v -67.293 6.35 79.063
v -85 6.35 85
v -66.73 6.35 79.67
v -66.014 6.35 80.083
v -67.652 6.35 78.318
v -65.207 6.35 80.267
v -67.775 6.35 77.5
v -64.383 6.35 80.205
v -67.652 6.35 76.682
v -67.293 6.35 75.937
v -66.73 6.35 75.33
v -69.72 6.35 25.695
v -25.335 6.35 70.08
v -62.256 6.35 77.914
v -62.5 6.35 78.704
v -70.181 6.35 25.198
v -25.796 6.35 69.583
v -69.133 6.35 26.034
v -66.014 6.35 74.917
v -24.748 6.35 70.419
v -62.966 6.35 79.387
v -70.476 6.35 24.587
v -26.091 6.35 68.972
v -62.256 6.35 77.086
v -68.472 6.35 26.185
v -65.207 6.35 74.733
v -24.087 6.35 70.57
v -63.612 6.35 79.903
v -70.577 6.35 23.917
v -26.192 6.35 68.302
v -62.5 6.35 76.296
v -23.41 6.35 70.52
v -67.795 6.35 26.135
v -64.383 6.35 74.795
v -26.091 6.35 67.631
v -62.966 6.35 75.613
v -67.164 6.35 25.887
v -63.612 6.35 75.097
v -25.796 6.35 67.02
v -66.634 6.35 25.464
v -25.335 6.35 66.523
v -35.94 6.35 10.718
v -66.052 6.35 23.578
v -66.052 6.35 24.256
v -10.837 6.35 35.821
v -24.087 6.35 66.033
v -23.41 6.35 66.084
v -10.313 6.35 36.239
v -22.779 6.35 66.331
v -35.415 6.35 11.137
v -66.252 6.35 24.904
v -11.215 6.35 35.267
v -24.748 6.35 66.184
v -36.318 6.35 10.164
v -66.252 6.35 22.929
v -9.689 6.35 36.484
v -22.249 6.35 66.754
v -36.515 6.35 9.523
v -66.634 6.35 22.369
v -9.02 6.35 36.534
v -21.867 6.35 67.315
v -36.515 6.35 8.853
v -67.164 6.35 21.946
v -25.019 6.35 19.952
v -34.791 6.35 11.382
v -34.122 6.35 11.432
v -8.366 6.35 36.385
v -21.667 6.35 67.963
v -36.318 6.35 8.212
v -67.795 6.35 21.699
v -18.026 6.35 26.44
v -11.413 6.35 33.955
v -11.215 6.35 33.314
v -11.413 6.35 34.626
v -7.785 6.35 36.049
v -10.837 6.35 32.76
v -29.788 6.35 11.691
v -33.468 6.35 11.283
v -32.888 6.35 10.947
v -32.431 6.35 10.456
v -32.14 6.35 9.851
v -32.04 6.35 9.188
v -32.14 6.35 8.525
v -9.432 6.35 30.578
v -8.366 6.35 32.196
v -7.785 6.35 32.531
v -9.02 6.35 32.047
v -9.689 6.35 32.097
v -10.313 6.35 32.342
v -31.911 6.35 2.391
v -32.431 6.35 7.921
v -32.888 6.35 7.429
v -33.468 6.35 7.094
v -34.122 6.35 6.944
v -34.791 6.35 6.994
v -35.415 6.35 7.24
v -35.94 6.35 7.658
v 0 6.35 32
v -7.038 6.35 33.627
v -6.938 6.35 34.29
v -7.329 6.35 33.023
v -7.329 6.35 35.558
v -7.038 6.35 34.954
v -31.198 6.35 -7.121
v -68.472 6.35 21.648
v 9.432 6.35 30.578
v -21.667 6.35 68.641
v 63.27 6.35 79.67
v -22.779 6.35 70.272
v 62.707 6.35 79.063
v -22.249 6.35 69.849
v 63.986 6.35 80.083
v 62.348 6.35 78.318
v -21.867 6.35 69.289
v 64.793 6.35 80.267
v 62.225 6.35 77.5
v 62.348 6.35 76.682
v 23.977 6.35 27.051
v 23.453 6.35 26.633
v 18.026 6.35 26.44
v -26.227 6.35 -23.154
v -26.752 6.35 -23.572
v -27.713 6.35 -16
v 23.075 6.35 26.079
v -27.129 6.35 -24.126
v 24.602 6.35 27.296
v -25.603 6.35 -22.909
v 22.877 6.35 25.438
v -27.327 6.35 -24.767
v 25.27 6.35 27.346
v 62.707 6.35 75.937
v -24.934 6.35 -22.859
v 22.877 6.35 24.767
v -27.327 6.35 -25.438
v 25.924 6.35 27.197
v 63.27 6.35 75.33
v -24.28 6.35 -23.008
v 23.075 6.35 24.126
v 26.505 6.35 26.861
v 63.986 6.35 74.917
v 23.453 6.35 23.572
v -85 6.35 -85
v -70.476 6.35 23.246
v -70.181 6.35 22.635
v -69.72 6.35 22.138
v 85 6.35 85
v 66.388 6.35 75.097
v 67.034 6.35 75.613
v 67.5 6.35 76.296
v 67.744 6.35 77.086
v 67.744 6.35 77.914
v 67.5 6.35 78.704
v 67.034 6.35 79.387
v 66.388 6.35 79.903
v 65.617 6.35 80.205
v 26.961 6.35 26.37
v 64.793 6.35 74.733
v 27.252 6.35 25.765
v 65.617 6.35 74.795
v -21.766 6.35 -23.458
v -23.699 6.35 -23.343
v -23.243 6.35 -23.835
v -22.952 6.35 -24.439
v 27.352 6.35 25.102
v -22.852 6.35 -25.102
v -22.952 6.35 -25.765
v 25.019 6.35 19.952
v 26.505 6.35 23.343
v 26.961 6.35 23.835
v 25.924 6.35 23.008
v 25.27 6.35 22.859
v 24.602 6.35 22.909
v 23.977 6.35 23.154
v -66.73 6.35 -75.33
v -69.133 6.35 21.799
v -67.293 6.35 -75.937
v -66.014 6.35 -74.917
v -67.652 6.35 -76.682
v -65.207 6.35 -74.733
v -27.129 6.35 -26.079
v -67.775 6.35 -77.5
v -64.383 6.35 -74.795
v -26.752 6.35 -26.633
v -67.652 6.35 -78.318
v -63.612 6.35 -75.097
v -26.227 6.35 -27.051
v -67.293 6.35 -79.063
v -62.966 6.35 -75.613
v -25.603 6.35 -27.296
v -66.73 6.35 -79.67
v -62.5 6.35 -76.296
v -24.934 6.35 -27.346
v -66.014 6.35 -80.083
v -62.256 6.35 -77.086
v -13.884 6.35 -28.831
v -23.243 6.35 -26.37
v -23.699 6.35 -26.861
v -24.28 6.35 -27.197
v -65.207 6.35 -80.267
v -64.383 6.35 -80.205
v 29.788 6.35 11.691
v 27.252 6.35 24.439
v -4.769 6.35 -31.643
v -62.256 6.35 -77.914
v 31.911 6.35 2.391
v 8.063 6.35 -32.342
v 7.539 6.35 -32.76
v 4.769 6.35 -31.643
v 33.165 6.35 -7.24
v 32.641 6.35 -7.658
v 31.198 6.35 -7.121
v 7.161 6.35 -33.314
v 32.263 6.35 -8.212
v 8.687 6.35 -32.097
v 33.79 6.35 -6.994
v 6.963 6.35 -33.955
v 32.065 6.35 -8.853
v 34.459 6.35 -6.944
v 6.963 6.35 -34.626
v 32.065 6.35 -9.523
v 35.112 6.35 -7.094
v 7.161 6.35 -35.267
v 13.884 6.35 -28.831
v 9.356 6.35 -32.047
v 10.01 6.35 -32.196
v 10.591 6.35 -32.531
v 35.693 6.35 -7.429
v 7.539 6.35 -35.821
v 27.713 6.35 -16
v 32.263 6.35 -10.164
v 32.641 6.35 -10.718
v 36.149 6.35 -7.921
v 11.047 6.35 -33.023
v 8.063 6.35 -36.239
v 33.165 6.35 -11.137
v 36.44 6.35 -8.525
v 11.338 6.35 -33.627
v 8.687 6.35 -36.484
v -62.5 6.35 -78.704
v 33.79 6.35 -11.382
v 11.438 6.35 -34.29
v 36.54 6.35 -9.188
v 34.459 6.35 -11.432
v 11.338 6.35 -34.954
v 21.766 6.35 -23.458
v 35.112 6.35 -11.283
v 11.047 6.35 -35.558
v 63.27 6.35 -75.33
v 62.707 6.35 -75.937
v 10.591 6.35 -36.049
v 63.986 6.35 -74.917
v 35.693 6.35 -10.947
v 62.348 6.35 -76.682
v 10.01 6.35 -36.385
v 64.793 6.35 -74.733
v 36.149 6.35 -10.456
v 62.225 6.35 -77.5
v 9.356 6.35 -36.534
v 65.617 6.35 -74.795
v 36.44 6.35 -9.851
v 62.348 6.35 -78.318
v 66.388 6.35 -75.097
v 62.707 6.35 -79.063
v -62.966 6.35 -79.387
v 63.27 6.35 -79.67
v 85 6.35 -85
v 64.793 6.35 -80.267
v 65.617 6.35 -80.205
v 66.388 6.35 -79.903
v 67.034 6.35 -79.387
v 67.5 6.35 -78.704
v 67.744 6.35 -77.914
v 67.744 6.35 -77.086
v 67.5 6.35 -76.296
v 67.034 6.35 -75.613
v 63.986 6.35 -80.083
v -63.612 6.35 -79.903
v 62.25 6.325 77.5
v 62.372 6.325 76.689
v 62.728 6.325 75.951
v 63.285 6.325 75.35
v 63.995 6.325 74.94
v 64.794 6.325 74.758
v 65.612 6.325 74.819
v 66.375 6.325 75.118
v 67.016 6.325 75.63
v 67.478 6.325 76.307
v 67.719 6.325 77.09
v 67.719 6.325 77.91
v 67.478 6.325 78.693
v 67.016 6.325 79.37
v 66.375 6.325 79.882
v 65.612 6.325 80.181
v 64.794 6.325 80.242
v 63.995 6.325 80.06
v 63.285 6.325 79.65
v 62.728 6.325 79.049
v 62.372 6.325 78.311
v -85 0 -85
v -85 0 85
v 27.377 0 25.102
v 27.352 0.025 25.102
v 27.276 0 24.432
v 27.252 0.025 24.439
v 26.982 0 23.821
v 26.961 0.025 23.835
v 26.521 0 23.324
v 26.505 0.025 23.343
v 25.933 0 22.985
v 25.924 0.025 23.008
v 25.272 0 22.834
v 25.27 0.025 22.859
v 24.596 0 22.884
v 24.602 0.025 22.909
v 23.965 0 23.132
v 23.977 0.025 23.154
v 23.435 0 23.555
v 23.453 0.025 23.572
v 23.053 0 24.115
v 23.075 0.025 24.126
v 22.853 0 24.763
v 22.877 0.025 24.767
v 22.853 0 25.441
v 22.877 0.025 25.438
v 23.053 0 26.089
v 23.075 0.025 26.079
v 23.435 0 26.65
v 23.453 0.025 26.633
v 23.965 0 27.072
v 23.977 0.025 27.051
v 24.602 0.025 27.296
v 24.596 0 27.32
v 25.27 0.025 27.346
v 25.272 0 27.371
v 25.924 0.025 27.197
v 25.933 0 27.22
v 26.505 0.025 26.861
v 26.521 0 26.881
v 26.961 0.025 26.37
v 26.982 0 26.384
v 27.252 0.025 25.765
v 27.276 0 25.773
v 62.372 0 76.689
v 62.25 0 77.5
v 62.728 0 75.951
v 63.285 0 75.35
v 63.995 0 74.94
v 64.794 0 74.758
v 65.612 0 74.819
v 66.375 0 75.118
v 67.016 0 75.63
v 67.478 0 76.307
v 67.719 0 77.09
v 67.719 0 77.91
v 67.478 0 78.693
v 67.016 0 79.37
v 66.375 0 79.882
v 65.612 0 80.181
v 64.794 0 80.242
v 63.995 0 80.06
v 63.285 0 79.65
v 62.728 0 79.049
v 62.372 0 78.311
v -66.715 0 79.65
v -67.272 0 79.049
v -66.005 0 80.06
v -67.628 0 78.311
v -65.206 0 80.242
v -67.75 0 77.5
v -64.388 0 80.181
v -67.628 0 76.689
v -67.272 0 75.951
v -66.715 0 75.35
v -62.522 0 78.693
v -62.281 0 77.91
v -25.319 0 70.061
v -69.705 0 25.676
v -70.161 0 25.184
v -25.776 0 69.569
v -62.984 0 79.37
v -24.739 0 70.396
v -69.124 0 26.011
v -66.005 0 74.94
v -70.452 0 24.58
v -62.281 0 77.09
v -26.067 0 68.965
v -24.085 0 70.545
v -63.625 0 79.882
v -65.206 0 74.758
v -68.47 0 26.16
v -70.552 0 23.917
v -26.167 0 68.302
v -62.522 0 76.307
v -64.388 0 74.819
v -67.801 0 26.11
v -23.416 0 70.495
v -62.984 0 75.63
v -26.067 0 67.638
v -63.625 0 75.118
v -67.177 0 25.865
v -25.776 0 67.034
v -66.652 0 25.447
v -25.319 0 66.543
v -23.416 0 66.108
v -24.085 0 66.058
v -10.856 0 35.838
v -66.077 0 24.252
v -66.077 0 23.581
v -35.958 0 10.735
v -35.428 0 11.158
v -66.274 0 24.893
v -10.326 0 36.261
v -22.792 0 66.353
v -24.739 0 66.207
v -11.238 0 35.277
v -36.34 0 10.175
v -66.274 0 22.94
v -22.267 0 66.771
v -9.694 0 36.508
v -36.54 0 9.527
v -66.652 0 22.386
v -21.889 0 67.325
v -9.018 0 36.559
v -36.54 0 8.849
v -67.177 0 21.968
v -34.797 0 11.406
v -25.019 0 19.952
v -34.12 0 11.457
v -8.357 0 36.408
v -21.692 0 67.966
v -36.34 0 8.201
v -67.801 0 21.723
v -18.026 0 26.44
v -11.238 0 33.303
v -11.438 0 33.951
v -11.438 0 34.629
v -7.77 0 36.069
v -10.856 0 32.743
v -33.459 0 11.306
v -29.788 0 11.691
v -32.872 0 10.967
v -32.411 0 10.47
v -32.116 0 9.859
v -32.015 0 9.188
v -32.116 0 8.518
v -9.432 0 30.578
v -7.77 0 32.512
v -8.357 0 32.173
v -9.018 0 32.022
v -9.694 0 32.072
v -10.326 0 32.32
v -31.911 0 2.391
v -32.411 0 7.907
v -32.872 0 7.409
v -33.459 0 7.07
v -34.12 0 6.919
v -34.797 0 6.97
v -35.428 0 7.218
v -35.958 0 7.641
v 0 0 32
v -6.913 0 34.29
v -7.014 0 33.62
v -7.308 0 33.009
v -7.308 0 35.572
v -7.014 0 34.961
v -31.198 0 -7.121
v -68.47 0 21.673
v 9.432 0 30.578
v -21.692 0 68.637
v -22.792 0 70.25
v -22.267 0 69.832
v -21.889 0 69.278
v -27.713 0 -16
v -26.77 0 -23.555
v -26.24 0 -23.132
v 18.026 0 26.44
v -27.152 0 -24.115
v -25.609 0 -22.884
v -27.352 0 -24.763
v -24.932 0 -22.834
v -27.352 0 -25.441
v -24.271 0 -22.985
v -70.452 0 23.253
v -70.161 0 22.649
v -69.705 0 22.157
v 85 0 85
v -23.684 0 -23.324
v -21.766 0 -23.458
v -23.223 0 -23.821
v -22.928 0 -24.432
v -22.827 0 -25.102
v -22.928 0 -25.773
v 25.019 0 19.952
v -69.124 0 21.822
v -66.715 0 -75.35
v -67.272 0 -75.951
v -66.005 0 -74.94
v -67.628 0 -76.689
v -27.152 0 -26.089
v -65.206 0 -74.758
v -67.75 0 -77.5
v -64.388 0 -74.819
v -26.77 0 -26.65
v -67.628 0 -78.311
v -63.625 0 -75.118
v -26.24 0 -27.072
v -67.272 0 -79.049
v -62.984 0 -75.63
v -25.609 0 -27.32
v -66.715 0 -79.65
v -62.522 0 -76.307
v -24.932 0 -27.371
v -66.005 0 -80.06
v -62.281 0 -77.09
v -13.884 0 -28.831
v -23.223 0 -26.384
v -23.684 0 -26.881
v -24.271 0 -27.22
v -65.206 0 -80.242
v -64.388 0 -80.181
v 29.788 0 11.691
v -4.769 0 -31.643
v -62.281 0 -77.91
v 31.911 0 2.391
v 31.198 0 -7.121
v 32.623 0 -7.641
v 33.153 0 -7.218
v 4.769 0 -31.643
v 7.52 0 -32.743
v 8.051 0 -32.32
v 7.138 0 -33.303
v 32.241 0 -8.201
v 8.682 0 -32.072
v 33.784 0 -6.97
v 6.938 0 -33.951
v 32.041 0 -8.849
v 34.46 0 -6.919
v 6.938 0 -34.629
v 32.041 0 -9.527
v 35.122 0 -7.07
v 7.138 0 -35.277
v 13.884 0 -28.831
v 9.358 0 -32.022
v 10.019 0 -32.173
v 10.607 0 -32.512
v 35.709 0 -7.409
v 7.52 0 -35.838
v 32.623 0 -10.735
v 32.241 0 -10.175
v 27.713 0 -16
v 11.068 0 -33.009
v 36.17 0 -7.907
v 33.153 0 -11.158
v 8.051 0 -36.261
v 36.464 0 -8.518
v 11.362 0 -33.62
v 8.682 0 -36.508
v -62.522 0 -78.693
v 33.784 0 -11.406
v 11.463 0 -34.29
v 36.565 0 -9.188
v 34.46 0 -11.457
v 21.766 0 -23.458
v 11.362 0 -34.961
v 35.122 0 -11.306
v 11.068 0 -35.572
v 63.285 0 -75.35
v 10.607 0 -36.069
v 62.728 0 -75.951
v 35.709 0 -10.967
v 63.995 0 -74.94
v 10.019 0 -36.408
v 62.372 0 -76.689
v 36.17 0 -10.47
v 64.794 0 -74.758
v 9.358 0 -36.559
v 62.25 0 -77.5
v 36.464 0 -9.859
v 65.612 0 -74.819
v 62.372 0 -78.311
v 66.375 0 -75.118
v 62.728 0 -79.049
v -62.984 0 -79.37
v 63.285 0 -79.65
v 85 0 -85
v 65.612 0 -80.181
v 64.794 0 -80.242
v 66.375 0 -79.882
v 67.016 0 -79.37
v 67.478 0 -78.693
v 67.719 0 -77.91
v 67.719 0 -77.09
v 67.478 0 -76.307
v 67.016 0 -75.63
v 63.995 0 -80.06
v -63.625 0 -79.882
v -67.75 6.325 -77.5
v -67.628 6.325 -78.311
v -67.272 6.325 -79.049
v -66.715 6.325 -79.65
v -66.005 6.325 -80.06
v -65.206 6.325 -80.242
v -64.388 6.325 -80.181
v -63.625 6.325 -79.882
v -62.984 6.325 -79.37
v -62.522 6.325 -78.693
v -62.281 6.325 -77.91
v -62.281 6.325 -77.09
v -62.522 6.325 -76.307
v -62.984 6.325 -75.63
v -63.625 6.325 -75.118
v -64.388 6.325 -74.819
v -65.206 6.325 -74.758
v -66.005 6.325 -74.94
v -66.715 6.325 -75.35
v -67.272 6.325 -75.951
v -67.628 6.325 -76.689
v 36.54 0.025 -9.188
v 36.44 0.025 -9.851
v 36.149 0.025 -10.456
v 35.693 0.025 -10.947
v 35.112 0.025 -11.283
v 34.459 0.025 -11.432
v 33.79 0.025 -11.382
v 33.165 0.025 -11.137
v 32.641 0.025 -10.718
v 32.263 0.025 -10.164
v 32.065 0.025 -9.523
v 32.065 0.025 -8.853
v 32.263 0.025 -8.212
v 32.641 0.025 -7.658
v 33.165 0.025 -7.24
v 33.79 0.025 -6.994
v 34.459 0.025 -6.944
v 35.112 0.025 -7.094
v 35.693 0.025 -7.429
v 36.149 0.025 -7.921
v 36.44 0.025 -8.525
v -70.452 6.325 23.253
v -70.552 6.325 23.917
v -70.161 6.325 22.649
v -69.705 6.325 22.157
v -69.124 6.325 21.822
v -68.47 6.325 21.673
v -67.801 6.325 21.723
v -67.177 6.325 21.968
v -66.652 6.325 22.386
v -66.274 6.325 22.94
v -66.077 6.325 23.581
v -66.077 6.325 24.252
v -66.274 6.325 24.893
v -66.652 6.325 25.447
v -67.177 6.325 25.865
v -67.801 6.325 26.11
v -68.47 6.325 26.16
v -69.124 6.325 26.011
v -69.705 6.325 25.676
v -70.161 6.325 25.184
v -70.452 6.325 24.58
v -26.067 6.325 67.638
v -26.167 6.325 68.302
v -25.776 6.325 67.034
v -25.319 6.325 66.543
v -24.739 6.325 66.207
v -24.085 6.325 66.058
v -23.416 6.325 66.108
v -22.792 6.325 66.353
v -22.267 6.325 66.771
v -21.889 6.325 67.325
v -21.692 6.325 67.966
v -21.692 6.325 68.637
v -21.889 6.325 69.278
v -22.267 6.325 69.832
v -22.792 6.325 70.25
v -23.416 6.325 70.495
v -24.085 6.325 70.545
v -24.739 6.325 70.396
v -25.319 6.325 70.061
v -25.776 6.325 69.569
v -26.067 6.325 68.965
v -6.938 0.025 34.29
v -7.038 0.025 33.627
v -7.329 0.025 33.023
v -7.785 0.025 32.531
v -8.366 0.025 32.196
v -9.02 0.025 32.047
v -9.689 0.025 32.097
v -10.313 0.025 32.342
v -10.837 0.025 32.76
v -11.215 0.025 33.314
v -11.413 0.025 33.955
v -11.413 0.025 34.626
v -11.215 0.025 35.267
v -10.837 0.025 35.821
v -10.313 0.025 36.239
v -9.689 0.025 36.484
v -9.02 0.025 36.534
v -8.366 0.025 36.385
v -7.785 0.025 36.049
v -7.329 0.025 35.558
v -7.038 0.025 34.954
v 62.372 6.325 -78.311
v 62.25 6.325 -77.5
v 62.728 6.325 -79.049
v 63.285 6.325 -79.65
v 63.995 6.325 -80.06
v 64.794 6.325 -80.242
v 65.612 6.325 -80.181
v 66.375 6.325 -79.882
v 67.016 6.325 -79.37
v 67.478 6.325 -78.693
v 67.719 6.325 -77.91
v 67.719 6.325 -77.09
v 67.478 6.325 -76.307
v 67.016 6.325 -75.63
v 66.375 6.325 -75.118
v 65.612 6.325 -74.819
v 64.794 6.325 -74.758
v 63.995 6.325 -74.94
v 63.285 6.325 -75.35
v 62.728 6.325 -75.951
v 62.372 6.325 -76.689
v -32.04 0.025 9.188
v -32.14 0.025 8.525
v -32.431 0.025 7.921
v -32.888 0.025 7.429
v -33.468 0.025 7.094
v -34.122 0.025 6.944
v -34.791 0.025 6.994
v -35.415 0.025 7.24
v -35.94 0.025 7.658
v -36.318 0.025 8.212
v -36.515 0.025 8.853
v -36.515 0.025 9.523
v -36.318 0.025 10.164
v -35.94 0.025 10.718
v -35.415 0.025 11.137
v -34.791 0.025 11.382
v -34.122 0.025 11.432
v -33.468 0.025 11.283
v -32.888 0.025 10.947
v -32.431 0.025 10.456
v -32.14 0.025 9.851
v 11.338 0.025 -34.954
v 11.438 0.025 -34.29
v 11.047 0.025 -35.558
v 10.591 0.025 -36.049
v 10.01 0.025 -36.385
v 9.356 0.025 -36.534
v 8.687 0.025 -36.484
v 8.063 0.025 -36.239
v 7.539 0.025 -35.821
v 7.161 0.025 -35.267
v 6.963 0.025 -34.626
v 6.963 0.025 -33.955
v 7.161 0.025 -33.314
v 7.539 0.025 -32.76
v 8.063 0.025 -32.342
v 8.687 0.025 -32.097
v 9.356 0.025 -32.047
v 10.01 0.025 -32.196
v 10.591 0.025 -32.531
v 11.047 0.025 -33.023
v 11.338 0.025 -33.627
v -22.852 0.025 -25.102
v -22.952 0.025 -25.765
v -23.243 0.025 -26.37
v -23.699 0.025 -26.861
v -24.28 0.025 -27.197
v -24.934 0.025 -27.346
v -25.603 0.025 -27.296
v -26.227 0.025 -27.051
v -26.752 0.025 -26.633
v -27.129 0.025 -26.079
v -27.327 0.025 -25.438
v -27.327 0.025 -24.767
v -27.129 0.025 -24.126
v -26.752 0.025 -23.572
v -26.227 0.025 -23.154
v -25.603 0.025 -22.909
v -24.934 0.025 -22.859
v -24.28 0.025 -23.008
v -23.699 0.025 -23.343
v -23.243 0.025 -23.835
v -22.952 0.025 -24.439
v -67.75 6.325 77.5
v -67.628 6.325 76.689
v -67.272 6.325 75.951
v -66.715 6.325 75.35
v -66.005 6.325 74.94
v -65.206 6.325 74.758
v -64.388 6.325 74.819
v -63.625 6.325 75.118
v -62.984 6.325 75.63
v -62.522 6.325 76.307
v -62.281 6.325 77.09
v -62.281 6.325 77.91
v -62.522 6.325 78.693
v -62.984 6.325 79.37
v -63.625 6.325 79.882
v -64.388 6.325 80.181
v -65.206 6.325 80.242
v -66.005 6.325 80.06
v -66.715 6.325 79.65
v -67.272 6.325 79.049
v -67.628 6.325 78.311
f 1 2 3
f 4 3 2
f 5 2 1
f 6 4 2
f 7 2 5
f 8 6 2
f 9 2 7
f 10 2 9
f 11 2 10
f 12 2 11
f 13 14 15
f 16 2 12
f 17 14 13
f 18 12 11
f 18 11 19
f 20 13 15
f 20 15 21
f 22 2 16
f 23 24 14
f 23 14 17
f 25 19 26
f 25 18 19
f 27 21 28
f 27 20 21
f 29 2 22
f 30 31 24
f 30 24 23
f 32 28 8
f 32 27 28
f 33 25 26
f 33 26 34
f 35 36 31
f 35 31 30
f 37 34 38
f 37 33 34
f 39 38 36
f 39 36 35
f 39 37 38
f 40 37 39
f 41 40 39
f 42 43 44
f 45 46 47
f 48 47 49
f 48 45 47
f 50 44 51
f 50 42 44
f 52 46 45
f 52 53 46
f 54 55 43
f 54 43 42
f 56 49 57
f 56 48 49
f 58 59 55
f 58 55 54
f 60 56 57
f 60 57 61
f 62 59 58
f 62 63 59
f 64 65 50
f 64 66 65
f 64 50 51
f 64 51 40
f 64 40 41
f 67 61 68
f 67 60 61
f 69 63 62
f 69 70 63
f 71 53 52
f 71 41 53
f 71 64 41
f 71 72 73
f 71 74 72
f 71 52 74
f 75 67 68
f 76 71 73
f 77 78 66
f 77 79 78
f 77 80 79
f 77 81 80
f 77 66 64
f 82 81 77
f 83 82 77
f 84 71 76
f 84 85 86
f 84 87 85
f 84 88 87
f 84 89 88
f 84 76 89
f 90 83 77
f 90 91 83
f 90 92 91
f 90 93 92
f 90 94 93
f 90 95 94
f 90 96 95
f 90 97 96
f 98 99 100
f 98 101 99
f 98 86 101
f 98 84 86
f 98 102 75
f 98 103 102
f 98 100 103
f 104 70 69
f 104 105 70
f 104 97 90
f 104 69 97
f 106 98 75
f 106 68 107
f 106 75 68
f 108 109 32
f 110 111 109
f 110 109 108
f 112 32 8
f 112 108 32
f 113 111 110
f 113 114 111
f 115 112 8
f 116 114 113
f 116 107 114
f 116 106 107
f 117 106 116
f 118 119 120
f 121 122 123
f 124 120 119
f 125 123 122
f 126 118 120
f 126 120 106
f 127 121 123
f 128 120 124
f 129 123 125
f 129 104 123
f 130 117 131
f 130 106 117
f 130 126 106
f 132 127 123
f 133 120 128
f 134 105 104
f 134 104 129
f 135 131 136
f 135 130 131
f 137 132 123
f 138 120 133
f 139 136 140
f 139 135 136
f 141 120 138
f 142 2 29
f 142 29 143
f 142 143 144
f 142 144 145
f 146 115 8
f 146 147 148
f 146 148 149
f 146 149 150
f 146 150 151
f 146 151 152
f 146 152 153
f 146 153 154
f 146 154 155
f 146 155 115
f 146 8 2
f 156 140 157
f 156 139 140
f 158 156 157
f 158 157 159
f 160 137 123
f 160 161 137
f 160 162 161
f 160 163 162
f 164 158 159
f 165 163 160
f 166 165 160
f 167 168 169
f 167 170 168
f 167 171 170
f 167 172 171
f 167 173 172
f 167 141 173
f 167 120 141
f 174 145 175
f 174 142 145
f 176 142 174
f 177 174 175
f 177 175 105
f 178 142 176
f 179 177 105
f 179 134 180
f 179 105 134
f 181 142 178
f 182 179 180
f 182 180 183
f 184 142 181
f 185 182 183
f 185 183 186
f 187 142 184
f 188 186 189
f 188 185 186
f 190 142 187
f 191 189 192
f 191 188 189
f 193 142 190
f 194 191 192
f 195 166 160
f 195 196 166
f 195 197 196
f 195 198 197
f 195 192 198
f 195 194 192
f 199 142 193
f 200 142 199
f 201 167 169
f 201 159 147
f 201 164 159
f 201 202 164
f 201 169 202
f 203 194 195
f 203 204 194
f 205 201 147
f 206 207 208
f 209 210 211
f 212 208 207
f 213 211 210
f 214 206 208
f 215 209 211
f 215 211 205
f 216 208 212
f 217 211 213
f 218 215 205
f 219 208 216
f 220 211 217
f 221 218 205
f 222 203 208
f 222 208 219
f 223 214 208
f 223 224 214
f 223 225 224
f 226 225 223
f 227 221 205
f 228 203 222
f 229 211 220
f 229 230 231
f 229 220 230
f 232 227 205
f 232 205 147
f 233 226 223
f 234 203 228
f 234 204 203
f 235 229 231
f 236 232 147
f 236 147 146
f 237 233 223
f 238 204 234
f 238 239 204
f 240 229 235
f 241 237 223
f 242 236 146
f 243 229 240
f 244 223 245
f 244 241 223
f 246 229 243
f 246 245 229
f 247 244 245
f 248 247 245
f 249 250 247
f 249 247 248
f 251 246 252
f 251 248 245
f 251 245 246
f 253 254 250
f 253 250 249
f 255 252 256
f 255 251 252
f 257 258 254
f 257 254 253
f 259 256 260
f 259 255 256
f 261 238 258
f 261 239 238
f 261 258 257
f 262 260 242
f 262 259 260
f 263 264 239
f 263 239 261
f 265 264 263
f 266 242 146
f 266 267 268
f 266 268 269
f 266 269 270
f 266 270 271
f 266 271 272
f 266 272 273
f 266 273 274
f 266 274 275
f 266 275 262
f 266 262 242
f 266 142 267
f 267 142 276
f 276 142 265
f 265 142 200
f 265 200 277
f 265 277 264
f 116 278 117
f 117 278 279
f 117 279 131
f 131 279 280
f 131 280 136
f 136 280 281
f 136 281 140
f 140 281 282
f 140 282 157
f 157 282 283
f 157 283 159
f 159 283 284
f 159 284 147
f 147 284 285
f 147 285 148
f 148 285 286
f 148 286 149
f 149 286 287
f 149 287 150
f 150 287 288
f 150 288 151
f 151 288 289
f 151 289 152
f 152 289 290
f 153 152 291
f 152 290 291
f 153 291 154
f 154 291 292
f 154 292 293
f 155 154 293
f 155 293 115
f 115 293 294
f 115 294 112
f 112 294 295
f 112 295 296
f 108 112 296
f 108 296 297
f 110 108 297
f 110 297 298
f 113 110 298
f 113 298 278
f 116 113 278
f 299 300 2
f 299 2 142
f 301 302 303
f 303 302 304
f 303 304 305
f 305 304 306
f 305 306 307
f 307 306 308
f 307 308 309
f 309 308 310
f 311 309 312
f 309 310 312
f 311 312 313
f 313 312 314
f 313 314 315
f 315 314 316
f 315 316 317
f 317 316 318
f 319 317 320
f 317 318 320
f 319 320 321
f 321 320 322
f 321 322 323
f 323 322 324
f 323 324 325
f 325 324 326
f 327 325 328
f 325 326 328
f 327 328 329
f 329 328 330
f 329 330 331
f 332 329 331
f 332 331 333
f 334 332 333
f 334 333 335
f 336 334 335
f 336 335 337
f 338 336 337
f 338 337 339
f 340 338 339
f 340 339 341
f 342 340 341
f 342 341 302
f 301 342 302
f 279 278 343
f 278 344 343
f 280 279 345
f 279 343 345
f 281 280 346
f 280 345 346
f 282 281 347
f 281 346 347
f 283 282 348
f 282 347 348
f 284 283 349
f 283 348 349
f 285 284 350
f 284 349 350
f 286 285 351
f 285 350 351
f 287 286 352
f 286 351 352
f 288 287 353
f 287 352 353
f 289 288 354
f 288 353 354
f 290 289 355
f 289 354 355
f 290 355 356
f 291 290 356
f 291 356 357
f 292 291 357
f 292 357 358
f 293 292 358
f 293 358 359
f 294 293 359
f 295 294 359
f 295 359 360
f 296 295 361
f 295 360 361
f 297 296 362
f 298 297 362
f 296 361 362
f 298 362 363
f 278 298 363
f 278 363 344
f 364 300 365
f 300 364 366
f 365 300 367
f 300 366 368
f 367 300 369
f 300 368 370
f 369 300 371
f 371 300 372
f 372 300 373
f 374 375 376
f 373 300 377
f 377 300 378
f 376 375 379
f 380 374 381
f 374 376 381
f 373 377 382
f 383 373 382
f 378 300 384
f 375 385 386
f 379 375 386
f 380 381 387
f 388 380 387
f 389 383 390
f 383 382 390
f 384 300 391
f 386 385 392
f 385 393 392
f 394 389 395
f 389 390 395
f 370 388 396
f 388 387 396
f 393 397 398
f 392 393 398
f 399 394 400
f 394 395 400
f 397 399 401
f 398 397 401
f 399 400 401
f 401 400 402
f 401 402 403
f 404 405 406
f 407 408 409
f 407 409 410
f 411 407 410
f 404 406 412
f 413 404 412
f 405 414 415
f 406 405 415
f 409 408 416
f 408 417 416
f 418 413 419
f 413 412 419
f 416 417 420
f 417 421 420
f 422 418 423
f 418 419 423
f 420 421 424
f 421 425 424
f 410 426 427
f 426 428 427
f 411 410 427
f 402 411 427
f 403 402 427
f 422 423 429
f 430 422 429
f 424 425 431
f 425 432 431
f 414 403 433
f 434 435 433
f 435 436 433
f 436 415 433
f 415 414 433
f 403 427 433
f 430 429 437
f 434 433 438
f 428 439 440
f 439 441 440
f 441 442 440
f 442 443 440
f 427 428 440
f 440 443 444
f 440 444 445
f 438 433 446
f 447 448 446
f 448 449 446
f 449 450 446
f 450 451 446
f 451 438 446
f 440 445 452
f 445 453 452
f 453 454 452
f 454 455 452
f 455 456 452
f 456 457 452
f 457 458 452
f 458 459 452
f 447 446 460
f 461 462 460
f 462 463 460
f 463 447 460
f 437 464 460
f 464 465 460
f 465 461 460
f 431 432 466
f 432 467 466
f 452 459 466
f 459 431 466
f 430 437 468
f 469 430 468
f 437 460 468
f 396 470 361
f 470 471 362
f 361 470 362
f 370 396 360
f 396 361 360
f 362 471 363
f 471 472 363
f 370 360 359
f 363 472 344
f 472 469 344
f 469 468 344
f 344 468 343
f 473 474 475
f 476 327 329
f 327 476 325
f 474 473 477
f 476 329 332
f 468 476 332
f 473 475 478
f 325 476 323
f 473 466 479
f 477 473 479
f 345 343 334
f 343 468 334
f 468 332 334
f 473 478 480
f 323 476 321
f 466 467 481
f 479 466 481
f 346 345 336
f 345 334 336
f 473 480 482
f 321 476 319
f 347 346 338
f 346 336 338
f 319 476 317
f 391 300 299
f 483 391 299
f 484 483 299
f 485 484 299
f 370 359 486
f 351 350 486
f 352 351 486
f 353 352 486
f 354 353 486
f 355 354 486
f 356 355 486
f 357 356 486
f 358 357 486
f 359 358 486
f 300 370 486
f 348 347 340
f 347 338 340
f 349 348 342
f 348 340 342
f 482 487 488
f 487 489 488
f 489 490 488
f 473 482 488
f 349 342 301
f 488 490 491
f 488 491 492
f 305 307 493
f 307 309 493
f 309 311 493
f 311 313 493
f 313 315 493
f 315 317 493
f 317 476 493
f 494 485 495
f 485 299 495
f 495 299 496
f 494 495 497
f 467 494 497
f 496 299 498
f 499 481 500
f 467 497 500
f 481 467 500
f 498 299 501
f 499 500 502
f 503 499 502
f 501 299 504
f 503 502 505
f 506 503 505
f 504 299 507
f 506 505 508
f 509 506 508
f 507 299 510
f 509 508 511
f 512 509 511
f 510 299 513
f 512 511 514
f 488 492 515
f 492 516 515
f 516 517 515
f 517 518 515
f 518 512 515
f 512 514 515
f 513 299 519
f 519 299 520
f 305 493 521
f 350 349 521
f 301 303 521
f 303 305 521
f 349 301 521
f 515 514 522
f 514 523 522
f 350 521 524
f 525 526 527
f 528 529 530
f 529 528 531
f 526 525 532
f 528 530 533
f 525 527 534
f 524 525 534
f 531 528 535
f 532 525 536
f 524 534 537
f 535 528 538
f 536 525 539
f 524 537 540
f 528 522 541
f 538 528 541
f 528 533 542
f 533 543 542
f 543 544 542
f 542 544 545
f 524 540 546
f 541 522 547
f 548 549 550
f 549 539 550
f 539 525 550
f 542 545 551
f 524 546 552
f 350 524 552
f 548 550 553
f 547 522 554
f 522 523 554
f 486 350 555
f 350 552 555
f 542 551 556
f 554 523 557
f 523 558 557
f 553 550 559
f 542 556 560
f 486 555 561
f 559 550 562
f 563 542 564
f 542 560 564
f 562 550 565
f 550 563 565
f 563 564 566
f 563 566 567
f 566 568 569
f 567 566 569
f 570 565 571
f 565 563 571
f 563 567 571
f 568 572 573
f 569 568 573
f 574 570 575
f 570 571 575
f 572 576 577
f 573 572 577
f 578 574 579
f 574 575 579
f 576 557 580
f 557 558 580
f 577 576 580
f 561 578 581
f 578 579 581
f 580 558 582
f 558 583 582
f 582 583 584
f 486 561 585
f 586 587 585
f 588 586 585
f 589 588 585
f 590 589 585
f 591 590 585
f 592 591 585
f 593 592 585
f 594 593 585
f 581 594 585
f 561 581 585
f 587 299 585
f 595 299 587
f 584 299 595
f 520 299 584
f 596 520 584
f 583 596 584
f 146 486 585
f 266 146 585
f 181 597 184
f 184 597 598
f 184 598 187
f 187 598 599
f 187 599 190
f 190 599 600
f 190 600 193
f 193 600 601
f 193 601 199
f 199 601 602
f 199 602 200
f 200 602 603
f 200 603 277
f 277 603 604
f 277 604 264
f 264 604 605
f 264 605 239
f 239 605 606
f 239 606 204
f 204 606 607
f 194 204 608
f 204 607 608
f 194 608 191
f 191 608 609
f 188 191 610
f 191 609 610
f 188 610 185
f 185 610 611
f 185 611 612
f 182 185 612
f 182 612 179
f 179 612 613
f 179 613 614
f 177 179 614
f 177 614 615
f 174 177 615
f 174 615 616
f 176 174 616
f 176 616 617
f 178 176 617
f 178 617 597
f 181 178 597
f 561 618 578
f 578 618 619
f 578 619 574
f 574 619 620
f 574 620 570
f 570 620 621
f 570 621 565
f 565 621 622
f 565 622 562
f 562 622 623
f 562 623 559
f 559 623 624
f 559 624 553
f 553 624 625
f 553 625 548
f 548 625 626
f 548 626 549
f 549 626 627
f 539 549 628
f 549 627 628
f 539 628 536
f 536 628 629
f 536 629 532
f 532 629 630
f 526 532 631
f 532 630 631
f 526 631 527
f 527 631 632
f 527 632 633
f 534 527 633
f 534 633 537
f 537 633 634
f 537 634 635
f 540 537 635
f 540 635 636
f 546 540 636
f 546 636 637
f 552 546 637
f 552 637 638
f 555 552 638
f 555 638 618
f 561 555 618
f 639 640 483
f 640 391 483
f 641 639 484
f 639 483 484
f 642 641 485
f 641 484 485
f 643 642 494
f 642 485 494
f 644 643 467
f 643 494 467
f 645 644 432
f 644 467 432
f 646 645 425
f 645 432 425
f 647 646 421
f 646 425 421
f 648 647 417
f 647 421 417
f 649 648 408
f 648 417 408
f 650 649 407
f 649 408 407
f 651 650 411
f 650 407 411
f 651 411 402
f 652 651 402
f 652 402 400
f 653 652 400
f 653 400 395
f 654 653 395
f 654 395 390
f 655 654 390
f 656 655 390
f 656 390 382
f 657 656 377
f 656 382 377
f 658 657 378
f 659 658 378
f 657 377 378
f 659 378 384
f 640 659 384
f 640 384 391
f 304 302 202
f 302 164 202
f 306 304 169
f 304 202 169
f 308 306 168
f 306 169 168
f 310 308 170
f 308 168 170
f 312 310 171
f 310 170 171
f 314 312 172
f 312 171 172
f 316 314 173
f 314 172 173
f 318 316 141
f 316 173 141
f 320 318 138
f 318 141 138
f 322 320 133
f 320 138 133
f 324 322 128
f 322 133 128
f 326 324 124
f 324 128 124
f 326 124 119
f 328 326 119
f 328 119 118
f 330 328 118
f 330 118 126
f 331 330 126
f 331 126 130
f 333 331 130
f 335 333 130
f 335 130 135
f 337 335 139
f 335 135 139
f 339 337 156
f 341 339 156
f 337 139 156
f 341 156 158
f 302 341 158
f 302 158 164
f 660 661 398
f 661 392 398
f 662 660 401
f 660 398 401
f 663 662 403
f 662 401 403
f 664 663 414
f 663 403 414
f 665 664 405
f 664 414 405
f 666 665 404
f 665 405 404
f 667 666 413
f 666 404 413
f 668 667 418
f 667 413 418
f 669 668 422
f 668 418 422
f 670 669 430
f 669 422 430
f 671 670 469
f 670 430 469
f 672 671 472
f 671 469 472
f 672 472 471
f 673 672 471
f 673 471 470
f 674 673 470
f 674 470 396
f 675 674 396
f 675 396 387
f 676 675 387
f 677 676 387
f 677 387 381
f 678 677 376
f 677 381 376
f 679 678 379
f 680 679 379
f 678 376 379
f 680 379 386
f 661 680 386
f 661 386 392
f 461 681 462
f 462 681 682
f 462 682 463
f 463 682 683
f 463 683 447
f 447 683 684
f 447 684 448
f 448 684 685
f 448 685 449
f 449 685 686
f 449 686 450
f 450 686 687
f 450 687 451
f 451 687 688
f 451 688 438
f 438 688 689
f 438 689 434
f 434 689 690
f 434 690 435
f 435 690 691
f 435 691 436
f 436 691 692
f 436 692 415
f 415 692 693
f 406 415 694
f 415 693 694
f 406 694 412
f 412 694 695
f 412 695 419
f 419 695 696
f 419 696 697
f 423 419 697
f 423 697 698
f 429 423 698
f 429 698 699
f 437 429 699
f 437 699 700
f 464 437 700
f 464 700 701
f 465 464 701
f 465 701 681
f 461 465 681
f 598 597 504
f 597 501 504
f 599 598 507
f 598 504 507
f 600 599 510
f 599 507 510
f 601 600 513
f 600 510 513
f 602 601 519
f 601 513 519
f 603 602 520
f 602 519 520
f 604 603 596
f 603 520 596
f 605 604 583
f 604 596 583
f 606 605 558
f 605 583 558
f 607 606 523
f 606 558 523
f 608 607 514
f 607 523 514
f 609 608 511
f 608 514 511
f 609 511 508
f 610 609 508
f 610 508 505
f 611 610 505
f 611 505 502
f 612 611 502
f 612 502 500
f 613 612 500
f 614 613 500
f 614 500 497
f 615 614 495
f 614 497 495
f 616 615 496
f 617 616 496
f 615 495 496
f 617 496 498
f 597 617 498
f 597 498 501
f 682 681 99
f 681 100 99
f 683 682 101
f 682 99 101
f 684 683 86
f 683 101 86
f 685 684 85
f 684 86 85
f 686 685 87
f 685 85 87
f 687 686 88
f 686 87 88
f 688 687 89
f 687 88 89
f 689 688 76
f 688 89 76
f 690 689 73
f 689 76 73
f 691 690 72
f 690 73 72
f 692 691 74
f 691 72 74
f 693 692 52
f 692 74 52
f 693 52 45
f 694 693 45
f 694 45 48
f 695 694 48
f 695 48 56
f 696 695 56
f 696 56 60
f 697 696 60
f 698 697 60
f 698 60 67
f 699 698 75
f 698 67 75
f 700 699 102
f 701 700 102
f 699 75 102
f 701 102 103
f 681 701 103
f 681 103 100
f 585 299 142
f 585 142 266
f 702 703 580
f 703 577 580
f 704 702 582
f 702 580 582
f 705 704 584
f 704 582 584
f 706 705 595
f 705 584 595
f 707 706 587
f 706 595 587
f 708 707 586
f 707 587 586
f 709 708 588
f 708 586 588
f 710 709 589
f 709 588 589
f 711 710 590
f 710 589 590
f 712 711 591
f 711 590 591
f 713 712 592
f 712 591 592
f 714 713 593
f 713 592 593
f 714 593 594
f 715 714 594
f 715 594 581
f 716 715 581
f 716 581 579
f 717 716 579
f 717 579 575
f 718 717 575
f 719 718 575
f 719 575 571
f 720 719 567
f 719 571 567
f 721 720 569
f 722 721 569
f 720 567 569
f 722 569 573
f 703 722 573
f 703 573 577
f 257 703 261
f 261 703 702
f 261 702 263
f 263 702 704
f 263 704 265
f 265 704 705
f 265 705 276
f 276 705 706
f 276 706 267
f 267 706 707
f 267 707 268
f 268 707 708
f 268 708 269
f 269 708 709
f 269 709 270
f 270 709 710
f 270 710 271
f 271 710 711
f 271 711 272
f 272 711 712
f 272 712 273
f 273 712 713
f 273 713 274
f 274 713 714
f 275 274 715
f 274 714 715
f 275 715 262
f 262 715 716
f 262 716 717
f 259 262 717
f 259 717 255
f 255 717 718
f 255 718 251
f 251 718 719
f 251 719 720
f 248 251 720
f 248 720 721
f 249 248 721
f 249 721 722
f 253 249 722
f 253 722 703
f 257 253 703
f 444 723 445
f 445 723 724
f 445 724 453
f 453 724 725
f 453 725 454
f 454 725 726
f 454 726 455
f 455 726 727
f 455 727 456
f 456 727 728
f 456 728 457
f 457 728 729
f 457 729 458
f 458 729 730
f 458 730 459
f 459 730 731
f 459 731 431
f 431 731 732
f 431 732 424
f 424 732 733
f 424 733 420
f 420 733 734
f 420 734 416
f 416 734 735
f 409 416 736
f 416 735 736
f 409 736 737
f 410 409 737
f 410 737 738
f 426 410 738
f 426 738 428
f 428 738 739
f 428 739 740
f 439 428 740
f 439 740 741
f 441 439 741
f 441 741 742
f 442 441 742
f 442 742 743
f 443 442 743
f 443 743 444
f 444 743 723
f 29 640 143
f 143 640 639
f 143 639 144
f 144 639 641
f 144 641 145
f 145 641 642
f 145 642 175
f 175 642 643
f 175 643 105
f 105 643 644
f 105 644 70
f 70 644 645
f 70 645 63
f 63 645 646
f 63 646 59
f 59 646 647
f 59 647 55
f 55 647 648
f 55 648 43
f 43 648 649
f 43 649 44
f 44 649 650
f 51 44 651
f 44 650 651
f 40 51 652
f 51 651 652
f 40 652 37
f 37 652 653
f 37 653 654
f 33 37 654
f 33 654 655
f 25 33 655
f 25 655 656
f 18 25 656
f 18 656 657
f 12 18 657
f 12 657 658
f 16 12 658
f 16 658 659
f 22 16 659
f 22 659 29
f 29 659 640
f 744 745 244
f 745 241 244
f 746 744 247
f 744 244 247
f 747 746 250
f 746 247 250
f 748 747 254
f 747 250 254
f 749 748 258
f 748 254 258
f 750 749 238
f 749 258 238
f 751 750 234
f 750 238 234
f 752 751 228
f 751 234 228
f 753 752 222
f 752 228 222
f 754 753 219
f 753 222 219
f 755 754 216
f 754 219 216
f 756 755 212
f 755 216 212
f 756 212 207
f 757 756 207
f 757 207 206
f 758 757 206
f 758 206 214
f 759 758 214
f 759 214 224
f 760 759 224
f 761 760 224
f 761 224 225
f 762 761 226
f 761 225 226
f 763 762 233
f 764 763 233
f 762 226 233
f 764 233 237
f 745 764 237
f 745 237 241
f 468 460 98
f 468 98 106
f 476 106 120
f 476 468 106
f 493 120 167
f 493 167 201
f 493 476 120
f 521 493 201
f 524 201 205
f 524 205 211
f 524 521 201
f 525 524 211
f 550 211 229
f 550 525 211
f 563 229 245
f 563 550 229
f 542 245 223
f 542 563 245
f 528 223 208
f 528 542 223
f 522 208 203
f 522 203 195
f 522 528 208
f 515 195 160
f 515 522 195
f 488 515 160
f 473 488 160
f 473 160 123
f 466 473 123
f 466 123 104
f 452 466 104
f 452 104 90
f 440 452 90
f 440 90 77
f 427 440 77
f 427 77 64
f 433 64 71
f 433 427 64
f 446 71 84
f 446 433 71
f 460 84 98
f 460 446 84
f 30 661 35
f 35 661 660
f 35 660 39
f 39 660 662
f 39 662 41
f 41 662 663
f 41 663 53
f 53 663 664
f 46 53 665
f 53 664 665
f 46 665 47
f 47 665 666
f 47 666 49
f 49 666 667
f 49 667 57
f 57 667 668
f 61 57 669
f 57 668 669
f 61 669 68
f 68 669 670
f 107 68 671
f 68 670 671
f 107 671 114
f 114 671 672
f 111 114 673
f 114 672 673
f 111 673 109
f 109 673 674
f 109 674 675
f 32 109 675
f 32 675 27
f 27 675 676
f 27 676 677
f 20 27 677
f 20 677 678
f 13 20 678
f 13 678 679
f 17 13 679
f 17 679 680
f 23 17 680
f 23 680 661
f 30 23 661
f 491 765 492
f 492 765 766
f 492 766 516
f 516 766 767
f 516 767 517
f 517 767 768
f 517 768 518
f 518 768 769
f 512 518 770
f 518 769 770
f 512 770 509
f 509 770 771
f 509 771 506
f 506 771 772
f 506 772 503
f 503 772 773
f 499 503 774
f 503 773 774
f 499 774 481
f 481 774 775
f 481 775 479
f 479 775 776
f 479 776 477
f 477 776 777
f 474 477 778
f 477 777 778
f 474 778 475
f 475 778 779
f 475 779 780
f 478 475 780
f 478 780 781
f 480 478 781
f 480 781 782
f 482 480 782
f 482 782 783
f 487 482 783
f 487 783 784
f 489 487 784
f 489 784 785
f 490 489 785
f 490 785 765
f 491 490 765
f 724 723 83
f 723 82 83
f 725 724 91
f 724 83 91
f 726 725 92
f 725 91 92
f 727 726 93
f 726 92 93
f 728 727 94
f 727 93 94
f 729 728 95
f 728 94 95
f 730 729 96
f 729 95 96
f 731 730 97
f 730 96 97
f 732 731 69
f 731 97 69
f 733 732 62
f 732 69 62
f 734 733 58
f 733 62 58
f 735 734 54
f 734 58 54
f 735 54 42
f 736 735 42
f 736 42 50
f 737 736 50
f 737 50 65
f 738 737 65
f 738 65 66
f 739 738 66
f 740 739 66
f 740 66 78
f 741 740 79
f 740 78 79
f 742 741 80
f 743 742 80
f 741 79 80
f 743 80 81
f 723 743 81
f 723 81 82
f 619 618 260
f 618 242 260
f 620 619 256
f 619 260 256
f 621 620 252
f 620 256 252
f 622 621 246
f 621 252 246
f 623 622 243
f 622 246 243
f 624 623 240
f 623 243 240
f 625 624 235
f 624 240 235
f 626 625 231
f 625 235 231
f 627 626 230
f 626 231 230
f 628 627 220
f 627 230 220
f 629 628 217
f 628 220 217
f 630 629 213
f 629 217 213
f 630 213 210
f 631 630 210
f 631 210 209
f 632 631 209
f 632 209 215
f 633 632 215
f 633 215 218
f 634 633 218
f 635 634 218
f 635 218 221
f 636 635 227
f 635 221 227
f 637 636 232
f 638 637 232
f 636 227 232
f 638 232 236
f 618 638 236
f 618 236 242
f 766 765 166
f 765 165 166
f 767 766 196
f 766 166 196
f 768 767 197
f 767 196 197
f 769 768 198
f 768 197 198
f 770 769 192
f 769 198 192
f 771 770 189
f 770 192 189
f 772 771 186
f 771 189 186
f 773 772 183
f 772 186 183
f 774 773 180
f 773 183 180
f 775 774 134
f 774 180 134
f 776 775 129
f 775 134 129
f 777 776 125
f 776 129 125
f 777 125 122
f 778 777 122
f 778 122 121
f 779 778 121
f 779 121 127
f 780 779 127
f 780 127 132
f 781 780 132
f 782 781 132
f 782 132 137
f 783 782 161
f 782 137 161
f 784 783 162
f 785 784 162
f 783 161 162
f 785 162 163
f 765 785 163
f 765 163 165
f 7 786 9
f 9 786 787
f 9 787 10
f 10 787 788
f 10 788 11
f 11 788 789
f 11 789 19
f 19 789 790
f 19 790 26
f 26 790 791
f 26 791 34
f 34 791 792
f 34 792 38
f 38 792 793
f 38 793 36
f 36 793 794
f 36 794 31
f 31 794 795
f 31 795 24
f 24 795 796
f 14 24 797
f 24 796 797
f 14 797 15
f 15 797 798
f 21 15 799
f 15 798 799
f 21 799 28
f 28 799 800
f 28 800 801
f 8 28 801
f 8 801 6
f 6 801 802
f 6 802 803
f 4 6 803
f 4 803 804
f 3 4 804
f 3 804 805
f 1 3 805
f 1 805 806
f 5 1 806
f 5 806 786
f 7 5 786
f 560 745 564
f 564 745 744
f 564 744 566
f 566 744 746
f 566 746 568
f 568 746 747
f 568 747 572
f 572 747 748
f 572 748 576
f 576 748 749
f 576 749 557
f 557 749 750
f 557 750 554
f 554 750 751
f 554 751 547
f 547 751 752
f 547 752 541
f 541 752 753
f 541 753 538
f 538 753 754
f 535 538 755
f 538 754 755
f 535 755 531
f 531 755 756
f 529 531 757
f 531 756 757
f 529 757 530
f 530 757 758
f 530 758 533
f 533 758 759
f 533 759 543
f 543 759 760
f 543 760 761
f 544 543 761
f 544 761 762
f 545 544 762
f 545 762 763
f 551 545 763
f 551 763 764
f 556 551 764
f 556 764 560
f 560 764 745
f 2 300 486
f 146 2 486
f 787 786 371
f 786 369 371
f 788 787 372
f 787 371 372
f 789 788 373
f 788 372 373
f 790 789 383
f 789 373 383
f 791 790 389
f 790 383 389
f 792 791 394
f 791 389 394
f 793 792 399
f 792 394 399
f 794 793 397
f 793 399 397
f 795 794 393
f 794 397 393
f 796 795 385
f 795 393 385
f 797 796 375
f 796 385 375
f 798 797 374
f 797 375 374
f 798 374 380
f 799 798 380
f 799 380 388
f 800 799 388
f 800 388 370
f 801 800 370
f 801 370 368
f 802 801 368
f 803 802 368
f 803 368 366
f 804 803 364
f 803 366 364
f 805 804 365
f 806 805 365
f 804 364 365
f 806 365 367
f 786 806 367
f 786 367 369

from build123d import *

# Parameters (mm, degrees)
SKETCH1_W                      = 170
SKETCH1_H                      = 170
SKETCH1_R                      = 32
BOSS_EXTRUDE3_DEPTH            = 6.35
M4_CLEARANCE_HOLE2_D           = 4.5
M4_CLEARANCE_HOLE2_CSINK_D     = 4.55
M4_CLEARANCE_HOLE2_CSINK_ANGLE = 90
M4_CLEARANCE_HOLE5_D           = 4.5
M4_CLEARANCE_HOLE5_CSINK_D     = 4.55
M4_CLEARANCE_HOLE5_CSINK_ANGLE = 90
M5_CLEARANCE_HOLE1_D           = 5.5
M5_CLEARANCE_HOLE1_CSINK_D     = 5.55
M5_CLEARANCE_HOLE1_CSINK_ANGLE = 90
M5_CLEARANCE_HOLE2_D           = 5.5
M5_CLEARANCE_HOLE2_CSINK_D     = 5.55
M5_CLEARANCE_HOLE2_CSINK_ANGLE = 90


with BuildPart() as part:
    # Sketch1 → Boss-Extrude3 (new body)
    with BuildSketch(Plane(origin=(0, 0, 0), x_dir=(1, 0, 0), z_dir=(0, 1, 0))):
        Rectangle(SKETCH1_W, SKETCH1_H)
        with Locations(Location((0, 0, 0), (0, 0, 270))):
            Circle(SKETCH1_R, mode=Mode.SUBTRACT)
    extrude(amount=BOSS_EXTRUDE3_DEPTH)

    # M4 Clearance Hole2 (through all)
    with Locations(Plane(origin=(0, 0, 0), x_dir=(-1, 0, 0), z_dir=(0, -1, 0))):
        with Locations((-9.188076101, 34.290366833), (25.102290732, 25.102290732), (34.290366833, -9.188076101), (9.188076101, -34.290366833), (-25.102290732, -25.102290732), (-34.290366833, 9.188076101)):
            CounterSinkHole(M4_CLEARANCE_HOLE2_D / 2, M4_CLEARANCE_HOLE2_CSINK_D / 2, counter_sink_angle=M4_CLEARANCE_HOLE2_CSINK_ANGLE)

    # M4 Clearance Hole5 (through all)
    with Locations(Plane(origin=(0, 6.35, 0), x_dir=(1, 0, 0), z_dir=(0, 1, 0))):
        with Locations((-68.301673362, -23.916580707), (-23.916580707, -68.301673362)):
            CounterSinkHole(M4_CLEARANCE_HOLE5_D / 2, M4_CLEARANCE_HOLE5_CSINK_D / 2, counter_sink_angle=M4_CLEARANCE_HOLE5_CSINK_ANGLE)

    # M5 Clearance Hole1 (through all)
    with Locations(Plane(origin=(0, 6.35, 0), x_dir=(1, 0, 0), z_dir=(0, 1, 0))):
        with Locations((-65, -77.5)):
            CounterSinkHole(M5_CLEARANCE_HOLE1_D / 2, M5_CLEARANCE_HOLE1_CSINK_D / 2, counter_sink_angle=M5_CLEARANCE_HOLE1_CSINK_ANGLE)

    # M5 Clearance Hole2 (through all)
    with Locations(Plane(origin=(0, 6.35, 0), x_dir=(1, 0, 0), z_dir=(0, 1, 0))):
        with Locations((-65, 77.5), (65, 77.5), (65, -77.5)):
            CounterSinkHole(M5_CLEARANCE_HOLE2_D / 2, M5_CLEARANCE_HOLE2_CSINK_D / 2, counter_sink_angle=M5_CLEARANCE_HOLE2_CSINK_ANGLE)


solid = part.part
